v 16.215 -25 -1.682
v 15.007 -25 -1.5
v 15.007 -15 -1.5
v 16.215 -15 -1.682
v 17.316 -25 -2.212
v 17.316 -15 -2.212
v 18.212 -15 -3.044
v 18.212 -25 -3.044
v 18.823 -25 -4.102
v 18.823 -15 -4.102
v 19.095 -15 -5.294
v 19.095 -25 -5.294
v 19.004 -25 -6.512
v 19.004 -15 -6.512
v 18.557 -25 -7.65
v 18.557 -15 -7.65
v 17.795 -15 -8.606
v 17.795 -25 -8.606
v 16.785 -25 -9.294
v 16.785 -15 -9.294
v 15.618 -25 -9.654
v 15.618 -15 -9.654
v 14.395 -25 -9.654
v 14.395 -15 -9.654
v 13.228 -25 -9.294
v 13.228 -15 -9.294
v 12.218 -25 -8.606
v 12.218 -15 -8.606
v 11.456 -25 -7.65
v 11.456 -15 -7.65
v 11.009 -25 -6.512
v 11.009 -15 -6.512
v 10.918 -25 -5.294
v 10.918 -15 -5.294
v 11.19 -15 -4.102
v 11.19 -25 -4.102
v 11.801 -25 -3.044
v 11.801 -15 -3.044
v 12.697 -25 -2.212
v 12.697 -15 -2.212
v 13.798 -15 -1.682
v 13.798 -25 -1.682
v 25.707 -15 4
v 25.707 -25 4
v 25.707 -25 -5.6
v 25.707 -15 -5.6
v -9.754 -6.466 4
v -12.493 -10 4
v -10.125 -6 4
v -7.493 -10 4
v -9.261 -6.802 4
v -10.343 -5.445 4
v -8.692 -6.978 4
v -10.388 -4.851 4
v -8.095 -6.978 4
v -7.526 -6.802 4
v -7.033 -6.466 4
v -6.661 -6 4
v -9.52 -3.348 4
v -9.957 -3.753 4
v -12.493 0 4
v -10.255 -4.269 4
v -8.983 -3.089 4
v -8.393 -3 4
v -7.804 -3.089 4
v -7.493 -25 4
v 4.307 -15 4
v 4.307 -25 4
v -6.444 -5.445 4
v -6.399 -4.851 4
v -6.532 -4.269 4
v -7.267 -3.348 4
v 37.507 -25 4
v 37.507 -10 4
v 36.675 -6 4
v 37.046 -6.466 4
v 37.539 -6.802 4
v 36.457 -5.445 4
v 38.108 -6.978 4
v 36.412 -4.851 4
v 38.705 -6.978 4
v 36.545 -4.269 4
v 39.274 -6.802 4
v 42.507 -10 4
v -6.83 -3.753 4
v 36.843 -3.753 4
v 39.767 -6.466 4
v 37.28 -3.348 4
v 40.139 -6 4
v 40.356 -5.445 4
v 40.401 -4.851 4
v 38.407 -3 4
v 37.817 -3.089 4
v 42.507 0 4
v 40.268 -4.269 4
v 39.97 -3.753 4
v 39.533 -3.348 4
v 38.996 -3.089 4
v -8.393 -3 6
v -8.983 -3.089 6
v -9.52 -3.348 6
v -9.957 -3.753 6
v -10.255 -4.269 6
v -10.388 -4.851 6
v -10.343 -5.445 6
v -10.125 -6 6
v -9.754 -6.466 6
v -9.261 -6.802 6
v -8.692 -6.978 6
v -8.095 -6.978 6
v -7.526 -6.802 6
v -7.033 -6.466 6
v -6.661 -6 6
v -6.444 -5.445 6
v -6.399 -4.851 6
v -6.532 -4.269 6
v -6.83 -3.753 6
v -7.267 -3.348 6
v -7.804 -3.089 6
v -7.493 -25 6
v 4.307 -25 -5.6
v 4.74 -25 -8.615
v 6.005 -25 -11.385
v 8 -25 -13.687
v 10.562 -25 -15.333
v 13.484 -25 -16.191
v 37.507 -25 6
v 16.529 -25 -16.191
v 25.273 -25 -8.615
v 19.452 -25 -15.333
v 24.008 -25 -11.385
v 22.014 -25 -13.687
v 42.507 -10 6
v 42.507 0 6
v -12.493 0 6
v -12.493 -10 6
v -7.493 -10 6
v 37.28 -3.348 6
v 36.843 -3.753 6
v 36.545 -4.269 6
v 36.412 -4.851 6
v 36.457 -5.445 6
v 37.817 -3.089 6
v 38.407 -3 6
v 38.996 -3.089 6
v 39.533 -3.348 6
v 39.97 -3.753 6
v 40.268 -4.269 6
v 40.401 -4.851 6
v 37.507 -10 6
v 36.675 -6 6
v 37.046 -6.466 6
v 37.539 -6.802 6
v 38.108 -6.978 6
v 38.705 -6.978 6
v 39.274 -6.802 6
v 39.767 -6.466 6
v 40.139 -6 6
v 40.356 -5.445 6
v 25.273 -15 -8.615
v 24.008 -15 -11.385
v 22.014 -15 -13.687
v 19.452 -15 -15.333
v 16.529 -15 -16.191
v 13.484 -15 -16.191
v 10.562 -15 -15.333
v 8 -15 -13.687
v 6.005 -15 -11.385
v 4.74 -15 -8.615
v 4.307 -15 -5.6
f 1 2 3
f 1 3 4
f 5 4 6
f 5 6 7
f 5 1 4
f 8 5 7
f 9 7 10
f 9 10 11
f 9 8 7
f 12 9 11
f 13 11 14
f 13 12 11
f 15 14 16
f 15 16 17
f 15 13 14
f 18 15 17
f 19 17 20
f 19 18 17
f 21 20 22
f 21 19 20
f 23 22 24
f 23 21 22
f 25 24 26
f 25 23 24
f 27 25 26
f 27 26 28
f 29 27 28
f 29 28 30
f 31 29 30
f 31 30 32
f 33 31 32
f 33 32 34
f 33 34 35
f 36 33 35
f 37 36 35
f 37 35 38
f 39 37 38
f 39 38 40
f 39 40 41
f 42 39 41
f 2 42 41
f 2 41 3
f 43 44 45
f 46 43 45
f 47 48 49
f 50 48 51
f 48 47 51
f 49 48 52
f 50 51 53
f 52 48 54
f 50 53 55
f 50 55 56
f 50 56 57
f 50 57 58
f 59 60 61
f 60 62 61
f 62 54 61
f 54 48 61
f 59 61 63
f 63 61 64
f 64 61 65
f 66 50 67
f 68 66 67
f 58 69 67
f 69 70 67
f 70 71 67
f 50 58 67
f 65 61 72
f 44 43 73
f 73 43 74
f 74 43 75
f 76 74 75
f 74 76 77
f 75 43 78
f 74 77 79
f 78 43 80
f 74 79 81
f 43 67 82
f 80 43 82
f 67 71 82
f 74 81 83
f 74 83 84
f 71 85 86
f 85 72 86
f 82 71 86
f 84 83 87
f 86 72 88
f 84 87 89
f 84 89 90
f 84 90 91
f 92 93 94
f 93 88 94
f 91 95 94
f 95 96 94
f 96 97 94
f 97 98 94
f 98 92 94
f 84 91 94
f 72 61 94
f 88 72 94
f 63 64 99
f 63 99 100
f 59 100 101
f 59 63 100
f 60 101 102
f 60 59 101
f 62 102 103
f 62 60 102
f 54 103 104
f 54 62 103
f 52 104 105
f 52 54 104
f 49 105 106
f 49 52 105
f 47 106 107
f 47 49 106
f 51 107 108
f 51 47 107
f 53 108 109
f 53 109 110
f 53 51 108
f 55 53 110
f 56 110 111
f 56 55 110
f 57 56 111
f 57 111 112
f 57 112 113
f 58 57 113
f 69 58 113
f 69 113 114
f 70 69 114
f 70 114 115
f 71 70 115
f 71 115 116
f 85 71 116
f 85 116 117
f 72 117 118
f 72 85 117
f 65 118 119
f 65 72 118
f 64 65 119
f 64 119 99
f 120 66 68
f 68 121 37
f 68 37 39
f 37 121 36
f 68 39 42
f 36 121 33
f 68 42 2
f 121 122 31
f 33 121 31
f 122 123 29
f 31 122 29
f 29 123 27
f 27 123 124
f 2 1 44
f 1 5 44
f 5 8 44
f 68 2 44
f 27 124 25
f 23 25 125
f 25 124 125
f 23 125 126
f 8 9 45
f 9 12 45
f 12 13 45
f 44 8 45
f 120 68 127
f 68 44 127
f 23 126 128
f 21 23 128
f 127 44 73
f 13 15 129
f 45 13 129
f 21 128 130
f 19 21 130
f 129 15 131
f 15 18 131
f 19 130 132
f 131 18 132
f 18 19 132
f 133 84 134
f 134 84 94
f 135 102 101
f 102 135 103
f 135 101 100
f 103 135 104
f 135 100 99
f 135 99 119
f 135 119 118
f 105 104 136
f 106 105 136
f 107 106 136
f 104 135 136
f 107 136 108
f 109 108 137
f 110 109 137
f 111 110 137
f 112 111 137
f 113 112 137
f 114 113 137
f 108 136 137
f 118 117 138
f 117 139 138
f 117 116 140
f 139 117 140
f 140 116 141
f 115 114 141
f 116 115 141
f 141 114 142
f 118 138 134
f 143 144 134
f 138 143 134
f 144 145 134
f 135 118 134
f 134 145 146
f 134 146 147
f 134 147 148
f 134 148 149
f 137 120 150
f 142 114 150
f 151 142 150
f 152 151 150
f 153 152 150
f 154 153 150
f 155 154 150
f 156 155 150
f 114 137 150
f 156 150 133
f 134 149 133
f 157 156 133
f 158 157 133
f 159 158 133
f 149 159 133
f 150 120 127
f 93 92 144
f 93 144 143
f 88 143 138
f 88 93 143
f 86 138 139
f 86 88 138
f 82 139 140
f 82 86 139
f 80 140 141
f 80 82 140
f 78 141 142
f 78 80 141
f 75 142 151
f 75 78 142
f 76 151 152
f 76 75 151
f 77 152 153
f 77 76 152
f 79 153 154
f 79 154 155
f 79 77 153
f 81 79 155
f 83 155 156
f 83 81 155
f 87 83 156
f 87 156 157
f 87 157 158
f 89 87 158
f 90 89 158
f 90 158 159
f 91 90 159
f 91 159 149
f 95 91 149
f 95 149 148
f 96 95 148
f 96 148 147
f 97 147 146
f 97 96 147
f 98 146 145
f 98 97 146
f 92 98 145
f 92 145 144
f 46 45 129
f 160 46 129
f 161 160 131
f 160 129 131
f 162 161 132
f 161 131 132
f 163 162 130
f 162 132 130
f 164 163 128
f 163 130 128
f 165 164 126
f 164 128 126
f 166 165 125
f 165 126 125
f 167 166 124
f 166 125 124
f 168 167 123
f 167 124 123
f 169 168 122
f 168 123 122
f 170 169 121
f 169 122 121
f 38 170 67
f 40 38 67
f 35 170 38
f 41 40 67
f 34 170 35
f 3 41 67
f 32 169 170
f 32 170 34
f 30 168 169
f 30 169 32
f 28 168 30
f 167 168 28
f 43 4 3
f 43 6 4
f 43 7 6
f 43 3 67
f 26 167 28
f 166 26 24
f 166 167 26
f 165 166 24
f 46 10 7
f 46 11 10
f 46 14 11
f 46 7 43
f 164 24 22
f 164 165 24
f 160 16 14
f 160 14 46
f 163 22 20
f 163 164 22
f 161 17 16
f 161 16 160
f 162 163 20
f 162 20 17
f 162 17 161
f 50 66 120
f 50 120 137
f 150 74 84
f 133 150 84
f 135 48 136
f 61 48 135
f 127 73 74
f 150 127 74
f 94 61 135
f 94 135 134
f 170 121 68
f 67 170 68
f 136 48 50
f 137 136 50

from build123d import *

# Parameters (mm, degrees)
BOSS_EXTRUDE1_START = 4
SKETCH1_W           = 45
SKETCH1_H           = 15
SKETCH1_W_2         = 55
SKETCH1_H_2         = 10
SKETCH1_R           = 2
BOSS_EXTRUDE1_DEPTH = 2
SKETCH2_R           = 10.7
SKETCH2_R_2         = 4.1
BOSS_EXTRUDE2_DEPTH = 10
BOSS_EXTRUDE3_START = -10
BOSS_EXTRUDE3_DEPTH = 10


with BuildPart() as part:
    # Sketch1 → Boss-Extrude1 (new body)
    # profile 1 of 2: a face of its own
    with BuildSketch(Plane.XY.offset(BOSS_EXTRUDE1_START)):
        with Locations((15.006572053, -17.5)):
            Rectangle(SKETCH1_W, SKETCH1_H)
    # profile 2 of 2: a face of its own
    with BuildSketch(Plane.XY.offset(BOSS_EXTRUDE1_START)):
        with Locations((15.006572053, -5)):
            Rectangle(SKETCH1_W_2, SKETCH1_H_2)
        with Locations(Location((-8.393427947, -5, 0), (0, 0, 90))):
            Circle(SKETCH1_R, mode=Mode.SUBTRACT)
        with Locations(Location((38.406572053, -5, 0), (0, 0, 90))):
            Circle(SKETCH1_R, mode=Mode.SUBTRACT)
    extrude(amount=BOSS_EXTRUDE1_DEPTH)

    # Sketch2 → Boss-Extrude2 (add)
    with BuildSketch(Plane(origin=(0, -25, 0), x_dir=(1, 0, 0), z_dir=(0, 1, 0))):
        with Locations((15.006572053, 5.6)):
            Circle(SKETCH2_R)
        with Locations(Location((15.006572053, 5.6, 0), (0, 0, 270))):
            Circle(SKETCH2_R_2, mode=Mode.SUBTRACT)
    extrude(amount=BOSS_EXTRUDE2_DEPTH)

    # Sketch3 → Boss-Extrude3 (add)
    with BuildSketch(Plane(origin=(0, -15, 0), x_dir=(1, 0, 0), z_dir=(0, 1, 0)).offset(BOSS_EXTRUDE3_START)):
        with BuildLine():
            Line((25.706572053, 5.6), (19.106572053, 5.6))
            ThreePointArc((19.106572053, 5.6), (15.006572053, 1.5), (10.906572053, 5.6))
            Line((10.906572053, 5.6), (4.306572053, 5.6))
            ThreePointArc((4.306572053, 5.6), (5.922177371, -0.053651322), (10.281109113, -4))
            Line((10.281109113, -4), (19.732034993, -4))
            ThreePointArc((19.732034993, -4), (24.090966734, -0.053651322), (25.706572053, 5.6))
        make_face()
        with BuildLine():
            Line((25.706572053, -6), (25.706572053, 5.6))
            ThreePointArc((25.706572053, 5.6), (24.090966734, -0.053651322), (19.732034993, -4))
            Line((19.732034993, -4), (10.281109113, -4))
            ThreePointArc((10.281109113, -4), (5.922177371, -0.053651322), (4.306572053, 5.6))
            Line((4.306572053, 5.6), (4.306572053, -6))
            Line((4.306572053, -6), (25.706572053, -6))
        make_face()
    extrude(amount=BOSS_EXTRUDE3_DEPTH)


solid = part.part
